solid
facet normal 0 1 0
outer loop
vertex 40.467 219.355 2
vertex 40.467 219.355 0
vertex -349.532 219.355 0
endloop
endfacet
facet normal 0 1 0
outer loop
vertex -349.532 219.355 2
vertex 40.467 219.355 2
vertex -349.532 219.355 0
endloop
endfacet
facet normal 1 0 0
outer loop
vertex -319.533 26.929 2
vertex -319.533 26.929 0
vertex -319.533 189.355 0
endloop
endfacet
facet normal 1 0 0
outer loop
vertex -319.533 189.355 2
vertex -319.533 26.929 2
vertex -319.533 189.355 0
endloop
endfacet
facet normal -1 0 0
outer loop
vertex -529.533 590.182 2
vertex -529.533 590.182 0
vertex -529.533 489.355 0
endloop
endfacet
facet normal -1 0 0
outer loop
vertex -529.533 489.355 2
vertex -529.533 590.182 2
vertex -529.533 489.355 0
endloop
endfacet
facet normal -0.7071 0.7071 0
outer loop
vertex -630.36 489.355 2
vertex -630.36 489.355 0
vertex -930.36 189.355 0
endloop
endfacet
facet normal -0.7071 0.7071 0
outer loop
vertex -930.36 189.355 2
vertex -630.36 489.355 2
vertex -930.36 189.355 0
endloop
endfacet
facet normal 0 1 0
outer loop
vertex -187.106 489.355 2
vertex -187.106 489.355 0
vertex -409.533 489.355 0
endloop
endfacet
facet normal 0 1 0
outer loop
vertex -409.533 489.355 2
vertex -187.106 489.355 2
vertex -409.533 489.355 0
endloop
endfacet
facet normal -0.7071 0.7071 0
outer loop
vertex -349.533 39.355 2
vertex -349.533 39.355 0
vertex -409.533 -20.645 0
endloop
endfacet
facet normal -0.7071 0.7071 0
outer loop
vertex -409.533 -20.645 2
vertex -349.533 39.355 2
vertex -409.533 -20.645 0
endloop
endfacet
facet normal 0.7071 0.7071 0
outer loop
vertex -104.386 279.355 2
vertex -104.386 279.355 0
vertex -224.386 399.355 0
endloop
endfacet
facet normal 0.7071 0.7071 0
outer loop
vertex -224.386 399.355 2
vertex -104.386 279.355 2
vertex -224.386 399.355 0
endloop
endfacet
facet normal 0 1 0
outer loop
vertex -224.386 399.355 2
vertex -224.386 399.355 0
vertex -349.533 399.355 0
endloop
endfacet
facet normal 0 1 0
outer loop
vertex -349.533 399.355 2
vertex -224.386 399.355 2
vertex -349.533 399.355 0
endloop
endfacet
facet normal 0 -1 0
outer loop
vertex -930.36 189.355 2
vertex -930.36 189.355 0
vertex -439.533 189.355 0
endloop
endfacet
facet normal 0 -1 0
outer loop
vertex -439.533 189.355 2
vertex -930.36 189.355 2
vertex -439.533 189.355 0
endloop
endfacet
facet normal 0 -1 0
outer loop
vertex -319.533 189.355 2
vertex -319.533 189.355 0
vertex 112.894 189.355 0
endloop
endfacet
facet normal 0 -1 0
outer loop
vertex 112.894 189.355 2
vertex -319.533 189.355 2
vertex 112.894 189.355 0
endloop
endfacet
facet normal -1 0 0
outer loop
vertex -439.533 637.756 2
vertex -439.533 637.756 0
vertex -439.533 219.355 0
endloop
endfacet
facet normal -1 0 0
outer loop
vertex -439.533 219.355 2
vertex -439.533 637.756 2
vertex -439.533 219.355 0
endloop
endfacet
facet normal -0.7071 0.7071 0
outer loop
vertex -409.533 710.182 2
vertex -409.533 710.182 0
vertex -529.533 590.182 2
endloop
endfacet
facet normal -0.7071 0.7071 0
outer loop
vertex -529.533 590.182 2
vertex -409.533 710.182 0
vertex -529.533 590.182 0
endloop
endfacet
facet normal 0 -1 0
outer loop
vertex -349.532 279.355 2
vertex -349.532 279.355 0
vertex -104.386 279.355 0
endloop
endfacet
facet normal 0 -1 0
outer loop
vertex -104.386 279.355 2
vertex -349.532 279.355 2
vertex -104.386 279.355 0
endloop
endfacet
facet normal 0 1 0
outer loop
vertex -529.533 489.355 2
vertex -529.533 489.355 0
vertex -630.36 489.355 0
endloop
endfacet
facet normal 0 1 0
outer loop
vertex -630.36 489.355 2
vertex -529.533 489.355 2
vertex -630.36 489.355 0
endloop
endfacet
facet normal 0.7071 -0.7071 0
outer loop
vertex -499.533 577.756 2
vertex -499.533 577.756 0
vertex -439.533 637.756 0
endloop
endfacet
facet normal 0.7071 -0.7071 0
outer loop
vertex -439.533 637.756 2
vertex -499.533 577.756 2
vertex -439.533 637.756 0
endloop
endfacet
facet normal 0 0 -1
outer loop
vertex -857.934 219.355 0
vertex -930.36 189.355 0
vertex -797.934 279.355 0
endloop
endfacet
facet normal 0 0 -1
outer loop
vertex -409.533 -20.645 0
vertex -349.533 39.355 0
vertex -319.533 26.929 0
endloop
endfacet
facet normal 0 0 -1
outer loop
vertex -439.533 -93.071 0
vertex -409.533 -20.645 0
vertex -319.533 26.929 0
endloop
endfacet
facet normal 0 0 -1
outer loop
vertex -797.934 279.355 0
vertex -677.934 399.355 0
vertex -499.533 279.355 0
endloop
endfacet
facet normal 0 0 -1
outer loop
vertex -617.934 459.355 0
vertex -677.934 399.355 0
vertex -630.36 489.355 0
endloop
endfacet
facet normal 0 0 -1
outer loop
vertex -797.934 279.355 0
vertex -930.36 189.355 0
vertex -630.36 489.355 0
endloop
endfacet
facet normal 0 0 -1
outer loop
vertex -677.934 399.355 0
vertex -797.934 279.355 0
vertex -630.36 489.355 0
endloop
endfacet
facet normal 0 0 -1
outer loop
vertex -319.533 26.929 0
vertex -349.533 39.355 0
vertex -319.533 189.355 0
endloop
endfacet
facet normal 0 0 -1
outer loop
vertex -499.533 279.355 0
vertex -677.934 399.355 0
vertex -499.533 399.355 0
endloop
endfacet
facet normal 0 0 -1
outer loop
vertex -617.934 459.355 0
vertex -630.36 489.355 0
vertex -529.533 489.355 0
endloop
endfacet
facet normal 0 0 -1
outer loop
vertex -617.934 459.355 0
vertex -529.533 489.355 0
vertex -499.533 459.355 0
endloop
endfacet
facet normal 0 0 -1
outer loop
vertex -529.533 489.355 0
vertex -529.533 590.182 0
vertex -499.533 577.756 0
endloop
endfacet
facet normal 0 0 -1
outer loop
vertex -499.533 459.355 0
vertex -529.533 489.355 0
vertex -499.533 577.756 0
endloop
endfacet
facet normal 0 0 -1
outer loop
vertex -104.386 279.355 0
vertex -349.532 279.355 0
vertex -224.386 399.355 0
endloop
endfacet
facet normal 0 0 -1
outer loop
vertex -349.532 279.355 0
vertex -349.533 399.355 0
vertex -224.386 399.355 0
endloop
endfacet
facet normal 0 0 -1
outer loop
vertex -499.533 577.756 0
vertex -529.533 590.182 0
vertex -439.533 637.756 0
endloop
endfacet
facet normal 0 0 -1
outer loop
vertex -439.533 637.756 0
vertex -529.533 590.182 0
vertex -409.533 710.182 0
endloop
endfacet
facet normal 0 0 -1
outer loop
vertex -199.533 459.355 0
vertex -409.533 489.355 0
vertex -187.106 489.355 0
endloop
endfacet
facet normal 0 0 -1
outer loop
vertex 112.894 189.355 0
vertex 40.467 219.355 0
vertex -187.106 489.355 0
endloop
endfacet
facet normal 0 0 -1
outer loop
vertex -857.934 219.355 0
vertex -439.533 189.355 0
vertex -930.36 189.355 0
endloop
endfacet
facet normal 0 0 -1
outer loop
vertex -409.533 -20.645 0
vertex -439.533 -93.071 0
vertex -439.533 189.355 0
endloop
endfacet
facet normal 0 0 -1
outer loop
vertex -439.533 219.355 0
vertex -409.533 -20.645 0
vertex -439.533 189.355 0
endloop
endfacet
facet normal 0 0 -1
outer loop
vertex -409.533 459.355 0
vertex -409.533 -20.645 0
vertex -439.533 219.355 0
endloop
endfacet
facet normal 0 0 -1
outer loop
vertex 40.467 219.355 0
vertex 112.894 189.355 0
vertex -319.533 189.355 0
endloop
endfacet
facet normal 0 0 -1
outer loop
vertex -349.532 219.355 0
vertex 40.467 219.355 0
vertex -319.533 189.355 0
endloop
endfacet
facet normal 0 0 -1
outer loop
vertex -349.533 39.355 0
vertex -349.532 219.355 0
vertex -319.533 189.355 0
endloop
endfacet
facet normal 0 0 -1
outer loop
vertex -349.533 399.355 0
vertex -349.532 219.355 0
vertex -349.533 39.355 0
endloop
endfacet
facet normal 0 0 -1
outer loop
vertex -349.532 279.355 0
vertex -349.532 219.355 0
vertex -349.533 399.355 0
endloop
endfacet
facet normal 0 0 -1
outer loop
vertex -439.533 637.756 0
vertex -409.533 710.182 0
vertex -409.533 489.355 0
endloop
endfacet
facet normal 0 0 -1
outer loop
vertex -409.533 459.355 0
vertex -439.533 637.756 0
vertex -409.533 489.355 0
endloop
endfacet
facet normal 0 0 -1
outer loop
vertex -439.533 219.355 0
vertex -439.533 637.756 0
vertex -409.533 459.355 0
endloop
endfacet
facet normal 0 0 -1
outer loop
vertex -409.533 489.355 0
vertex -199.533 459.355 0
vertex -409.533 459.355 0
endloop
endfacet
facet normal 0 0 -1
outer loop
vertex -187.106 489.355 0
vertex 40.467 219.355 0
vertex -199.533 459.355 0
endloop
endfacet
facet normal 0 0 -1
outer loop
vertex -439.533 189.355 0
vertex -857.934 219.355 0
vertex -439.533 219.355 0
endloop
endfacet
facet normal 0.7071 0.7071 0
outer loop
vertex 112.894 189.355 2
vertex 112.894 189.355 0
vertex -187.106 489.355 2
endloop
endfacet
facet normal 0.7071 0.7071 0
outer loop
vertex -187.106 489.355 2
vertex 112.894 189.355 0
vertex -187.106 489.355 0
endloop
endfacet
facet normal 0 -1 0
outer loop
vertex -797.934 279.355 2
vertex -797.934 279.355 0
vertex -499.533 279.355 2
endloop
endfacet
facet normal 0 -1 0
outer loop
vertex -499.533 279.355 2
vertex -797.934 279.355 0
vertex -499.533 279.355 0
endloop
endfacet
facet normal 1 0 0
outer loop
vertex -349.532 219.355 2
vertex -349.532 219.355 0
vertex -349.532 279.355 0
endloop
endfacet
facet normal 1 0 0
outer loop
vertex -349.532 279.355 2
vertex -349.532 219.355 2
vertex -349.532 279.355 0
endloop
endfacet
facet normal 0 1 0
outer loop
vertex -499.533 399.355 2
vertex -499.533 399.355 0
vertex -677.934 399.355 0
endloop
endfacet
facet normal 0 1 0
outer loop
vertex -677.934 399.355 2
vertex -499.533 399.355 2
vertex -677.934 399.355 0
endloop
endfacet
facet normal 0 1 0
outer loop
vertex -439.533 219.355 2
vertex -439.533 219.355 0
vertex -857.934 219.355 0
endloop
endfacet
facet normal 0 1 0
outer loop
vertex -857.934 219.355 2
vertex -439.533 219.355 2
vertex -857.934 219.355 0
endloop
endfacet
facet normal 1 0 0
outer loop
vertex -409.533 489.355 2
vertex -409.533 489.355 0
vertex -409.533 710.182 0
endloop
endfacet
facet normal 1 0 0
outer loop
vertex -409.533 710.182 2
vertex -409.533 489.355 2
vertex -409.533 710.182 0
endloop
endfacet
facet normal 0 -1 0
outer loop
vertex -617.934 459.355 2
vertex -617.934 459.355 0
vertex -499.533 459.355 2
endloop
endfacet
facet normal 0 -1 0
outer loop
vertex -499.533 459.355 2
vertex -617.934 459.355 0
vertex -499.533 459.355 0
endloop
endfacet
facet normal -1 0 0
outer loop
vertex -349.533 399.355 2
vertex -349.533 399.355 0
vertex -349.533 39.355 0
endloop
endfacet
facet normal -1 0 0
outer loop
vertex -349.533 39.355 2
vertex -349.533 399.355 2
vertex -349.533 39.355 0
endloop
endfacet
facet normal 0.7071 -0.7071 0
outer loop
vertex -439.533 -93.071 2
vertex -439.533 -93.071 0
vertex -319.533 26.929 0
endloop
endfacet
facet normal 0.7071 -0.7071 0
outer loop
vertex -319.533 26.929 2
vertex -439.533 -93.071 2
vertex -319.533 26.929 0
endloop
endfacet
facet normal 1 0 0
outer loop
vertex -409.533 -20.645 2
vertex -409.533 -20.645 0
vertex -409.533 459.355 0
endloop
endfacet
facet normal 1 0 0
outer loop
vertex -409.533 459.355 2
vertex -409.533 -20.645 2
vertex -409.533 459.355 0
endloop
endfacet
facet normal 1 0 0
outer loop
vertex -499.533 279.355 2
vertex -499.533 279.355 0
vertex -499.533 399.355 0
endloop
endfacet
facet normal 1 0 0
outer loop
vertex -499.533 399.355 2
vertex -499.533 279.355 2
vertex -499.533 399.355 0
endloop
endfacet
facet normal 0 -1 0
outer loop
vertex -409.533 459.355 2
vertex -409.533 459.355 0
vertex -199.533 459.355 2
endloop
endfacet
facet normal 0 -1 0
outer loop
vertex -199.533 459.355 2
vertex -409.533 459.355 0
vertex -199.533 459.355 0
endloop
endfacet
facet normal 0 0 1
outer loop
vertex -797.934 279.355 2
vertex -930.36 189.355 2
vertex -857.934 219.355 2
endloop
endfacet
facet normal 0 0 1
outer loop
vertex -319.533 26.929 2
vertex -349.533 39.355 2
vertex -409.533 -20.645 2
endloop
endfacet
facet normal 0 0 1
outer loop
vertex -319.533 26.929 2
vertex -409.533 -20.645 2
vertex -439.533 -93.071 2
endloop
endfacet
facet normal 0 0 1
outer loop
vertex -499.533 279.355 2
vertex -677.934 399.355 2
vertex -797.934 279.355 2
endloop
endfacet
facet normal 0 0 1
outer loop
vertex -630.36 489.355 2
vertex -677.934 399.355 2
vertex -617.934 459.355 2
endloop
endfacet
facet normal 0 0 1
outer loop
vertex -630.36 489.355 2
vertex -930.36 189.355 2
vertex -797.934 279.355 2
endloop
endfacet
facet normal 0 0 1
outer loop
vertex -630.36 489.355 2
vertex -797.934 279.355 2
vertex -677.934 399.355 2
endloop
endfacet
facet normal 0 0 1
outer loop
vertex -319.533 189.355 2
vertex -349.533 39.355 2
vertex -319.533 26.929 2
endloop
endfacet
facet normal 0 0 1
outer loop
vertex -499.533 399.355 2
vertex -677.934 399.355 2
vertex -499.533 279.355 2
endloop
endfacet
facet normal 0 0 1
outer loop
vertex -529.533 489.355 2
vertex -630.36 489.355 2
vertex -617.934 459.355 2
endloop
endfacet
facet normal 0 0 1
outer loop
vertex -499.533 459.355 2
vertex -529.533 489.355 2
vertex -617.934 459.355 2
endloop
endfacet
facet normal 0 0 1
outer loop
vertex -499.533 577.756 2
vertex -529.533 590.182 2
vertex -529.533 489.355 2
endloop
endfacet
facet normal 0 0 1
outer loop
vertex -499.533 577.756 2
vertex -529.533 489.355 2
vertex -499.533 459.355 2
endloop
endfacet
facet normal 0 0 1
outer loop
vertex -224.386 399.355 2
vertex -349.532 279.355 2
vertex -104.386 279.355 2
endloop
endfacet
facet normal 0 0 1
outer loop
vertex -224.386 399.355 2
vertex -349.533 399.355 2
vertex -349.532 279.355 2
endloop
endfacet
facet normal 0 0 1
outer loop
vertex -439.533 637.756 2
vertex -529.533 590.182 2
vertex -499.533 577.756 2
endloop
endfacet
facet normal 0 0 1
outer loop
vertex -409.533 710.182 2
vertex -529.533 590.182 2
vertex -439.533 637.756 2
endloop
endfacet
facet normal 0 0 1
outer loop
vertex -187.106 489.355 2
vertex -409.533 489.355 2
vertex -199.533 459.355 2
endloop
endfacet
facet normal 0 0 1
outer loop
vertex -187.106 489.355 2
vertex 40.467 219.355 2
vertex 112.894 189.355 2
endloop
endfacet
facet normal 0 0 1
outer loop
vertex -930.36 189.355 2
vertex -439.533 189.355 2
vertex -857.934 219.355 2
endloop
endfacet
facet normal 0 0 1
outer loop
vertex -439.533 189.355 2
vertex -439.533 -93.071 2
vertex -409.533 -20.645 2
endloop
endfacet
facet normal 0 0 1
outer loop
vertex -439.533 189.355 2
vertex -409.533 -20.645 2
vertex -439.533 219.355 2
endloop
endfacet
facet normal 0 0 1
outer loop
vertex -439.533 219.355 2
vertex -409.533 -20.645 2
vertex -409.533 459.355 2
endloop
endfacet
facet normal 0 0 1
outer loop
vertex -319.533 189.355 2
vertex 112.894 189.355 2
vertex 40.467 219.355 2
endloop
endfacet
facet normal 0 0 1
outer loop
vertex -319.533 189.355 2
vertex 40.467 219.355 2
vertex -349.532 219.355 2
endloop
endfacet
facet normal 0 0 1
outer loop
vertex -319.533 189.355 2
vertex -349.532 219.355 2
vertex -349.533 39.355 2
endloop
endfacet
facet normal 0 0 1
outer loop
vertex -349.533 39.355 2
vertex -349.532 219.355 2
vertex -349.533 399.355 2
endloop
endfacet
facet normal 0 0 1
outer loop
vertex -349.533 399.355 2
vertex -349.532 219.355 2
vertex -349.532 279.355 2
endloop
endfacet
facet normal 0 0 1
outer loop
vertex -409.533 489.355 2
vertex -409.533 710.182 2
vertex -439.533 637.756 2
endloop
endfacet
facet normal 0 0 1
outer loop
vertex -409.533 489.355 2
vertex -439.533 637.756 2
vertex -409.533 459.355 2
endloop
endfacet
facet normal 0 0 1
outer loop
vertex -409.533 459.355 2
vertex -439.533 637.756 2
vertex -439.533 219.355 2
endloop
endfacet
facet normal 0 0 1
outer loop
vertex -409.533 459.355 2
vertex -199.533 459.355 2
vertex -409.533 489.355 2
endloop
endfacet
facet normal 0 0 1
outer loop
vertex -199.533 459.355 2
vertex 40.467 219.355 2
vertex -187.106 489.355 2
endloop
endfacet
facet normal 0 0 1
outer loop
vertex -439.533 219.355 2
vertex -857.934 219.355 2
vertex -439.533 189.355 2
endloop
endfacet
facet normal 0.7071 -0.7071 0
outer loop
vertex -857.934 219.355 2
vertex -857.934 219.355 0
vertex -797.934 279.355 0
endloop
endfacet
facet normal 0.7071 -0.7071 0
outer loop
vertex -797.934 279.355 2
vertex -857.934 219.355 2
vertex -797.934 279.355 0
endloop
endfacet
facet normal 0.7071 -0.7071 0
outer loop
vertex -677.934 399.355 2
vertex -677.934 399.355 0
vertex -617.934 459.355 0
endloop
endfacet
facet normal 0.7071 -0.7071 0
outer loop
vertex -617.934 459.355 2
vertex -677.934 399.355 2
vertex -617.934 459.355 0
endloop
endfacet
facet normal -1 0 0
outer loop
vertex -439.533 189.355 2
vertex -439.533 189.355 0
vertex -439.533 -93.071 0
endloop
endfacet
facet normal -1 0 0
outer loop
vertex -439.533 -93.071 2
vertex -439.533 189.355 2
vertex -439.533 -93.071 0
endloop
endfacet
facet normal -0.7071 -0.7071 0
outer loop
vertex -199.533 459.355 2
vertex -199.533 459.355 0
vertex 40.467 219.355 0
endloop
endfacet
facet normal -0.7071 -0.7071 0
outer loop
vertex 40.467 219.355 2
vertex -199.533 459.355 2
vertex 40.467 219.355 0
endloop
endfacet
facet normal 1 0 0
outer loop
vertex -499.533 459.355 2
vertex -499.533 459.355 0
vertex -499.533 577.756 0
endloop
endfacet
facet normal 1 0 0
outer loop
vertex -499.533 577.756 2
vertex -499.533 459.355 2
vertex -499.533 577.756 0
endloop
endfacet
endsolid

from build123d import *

# Parameters (mm, degrees)
F0_W     = 0.001
F0_H     = 60
F1_DEPTH = 2


# Not quite as in the source:
# - a feature names something its author has since deleted; it is built from what else it names


with BuildPart() as f1:
    # F0 (on Top) → F1 (new body)
    with BuildSketch(Plane.XY):
        Polygon((-409.5329046249, 667.7558401073), (-409.5329046249, 703.2591700554), (-409.5329046249, 710.1822469785), (-439.5329046249, 680.1822469785), (-439.5329046249, 637.7558401073), align=None)
        Polygon((-409.5329046249, 489.3550023332), (-409.5329046249, 667.7558401073), (-439.5329046249, 637.7558401073), (-439.5329046249, 219.3550023332), (-439.5329046249, 189.3550023332), (-439.5329046249, -93.071404538), (-409.5329046249, -63.071404538), (-409.5329046249, -20.6449976668), (-409.5329046249, 189.3550023332), (-409.5329046249, 279.3550023332), (-409.5329046249, 399.3550023332), (-409.5329046249, 459.3550023332), align=None)
        Polygon((-187.1064977537, 489.3550023332), (-409.5329046249, 489.3550023332), (-409.5329046249, 459.3550023332), (-199.5329046249, 459.3550023332), (-157.1064977537, 459.3550023332), align=None)
        Polygon((-499.5329046249, 577.7558401073), (-439.5329046249, 637.7558401073), (-439.5329046249, 680.1822469785), (-499.5329046249, 620.1822469785), (-499.5329046249, 579.3550023332), align=None)
        Polygon((-439.5329046249, 189.3550023332), (-439.5329046249, 219.3550023332), (-857.933742399, 219.3550023332), (-887.933742399, 189.3550023332), align=None)
        Polygon((-529.5329046249, 547.7558401073), (-499.5329046249, 577.7558401073), (-499.5329046249, 579.3550023332), (-499.5329046249, 620.1822469785), (-529.5329046249, 590.1822469785), align=None)
        Polygon((-499.5329046249, 459.3550023332), (-499.5329046249, 577.7558401073), (-529.5329046249, 547.7558401073), (-529.5329046249, 489.3550023332), (-587.933742399, 489.3550023332), (-617.933742399, 459.3550023332), align=None)
        Polygon((-157.1064977537, 459.3550023332), (-199.5329046249, 459.3550023332), (-139.5329046249, 399.3550023332), (40.4670953751, 219.3550023332), (-44.3857183673, 219.3550023332), (-349.5319046249, 219.3550023332), (-349.5329046249, 219.3550023332), (-349.5329046249, 189.3550023332), (-319.5329046249, 189.3550023332), (112.8935022463, 189.3550023332), align=None)
        Polygon((-887.933742399, 189.3550023332), (-857.933742399, 219.3550023332), (-900.3601492702, 219.3550023332), (-930.3601492702, 189.3550023332), align=None)
        Polygon((-900.3601492702, 219.3550023332), (-857.933742399, 219.3550023332), (-797.933742399, 279.3550023332), (-840.3601492702, 279.3550023332), align=None)
        Polygon((-224.3857183673, 399.3550023332), (-349.5329046249, 399.3550023332), (-349.5329046249, 279.3550023332), (-349.5319046249, 279.3550023332), (-104.3857183673, 279.3550023332), align=None)
        Polygon((-677.933742399, 399.3550023332), (-797.933742399, 279.3550023332), (-499.5329046249, 279.3550023332), (-499.5329046249, 399.3550023332), align=None)
        Polygon((-840.3601492702, 279.3550023332), (-797.933742399, 279.3550023332), (-677.933742399, 399.3550023332), (-720.3601492702, 399.3550023332), align=None)
        Polygon((-677.933742399, 399.3550023332), (-617.933742399, 459.3550023332), (-660.3601492702, 459.3550023332), (-720.3601492702, 399.3550023332), align=None)
        Polygon((-660.3601492702, 459.3550023332), (-617.933742399, 459.3550023332), (-587.933742399, 489.3550023332), (-630.3601492702, 489.3550023332), align=None)
        with Locations((-349.5324046249, 249.3550023332)):
            Rectangle(F0_W, F0_H)
        Polygon((-319.5329046249, 26.928595462), (-319.5329046249, 189.3550023332), (-349.5329046249, 189.3550023332), (-349.5329046249, 39.3550023332), (-349.5329046249, -3.071404538), align=None)
        Polygon((-409.5329046249, -20.6449976668), (-409.5329046249, -63.071404538), (-349.5329046249, -3.071404538), (-349.5329046249, 39.3550023332), align=None)
    extrude(amount=F1_DEPTH)


solid = f1.part
